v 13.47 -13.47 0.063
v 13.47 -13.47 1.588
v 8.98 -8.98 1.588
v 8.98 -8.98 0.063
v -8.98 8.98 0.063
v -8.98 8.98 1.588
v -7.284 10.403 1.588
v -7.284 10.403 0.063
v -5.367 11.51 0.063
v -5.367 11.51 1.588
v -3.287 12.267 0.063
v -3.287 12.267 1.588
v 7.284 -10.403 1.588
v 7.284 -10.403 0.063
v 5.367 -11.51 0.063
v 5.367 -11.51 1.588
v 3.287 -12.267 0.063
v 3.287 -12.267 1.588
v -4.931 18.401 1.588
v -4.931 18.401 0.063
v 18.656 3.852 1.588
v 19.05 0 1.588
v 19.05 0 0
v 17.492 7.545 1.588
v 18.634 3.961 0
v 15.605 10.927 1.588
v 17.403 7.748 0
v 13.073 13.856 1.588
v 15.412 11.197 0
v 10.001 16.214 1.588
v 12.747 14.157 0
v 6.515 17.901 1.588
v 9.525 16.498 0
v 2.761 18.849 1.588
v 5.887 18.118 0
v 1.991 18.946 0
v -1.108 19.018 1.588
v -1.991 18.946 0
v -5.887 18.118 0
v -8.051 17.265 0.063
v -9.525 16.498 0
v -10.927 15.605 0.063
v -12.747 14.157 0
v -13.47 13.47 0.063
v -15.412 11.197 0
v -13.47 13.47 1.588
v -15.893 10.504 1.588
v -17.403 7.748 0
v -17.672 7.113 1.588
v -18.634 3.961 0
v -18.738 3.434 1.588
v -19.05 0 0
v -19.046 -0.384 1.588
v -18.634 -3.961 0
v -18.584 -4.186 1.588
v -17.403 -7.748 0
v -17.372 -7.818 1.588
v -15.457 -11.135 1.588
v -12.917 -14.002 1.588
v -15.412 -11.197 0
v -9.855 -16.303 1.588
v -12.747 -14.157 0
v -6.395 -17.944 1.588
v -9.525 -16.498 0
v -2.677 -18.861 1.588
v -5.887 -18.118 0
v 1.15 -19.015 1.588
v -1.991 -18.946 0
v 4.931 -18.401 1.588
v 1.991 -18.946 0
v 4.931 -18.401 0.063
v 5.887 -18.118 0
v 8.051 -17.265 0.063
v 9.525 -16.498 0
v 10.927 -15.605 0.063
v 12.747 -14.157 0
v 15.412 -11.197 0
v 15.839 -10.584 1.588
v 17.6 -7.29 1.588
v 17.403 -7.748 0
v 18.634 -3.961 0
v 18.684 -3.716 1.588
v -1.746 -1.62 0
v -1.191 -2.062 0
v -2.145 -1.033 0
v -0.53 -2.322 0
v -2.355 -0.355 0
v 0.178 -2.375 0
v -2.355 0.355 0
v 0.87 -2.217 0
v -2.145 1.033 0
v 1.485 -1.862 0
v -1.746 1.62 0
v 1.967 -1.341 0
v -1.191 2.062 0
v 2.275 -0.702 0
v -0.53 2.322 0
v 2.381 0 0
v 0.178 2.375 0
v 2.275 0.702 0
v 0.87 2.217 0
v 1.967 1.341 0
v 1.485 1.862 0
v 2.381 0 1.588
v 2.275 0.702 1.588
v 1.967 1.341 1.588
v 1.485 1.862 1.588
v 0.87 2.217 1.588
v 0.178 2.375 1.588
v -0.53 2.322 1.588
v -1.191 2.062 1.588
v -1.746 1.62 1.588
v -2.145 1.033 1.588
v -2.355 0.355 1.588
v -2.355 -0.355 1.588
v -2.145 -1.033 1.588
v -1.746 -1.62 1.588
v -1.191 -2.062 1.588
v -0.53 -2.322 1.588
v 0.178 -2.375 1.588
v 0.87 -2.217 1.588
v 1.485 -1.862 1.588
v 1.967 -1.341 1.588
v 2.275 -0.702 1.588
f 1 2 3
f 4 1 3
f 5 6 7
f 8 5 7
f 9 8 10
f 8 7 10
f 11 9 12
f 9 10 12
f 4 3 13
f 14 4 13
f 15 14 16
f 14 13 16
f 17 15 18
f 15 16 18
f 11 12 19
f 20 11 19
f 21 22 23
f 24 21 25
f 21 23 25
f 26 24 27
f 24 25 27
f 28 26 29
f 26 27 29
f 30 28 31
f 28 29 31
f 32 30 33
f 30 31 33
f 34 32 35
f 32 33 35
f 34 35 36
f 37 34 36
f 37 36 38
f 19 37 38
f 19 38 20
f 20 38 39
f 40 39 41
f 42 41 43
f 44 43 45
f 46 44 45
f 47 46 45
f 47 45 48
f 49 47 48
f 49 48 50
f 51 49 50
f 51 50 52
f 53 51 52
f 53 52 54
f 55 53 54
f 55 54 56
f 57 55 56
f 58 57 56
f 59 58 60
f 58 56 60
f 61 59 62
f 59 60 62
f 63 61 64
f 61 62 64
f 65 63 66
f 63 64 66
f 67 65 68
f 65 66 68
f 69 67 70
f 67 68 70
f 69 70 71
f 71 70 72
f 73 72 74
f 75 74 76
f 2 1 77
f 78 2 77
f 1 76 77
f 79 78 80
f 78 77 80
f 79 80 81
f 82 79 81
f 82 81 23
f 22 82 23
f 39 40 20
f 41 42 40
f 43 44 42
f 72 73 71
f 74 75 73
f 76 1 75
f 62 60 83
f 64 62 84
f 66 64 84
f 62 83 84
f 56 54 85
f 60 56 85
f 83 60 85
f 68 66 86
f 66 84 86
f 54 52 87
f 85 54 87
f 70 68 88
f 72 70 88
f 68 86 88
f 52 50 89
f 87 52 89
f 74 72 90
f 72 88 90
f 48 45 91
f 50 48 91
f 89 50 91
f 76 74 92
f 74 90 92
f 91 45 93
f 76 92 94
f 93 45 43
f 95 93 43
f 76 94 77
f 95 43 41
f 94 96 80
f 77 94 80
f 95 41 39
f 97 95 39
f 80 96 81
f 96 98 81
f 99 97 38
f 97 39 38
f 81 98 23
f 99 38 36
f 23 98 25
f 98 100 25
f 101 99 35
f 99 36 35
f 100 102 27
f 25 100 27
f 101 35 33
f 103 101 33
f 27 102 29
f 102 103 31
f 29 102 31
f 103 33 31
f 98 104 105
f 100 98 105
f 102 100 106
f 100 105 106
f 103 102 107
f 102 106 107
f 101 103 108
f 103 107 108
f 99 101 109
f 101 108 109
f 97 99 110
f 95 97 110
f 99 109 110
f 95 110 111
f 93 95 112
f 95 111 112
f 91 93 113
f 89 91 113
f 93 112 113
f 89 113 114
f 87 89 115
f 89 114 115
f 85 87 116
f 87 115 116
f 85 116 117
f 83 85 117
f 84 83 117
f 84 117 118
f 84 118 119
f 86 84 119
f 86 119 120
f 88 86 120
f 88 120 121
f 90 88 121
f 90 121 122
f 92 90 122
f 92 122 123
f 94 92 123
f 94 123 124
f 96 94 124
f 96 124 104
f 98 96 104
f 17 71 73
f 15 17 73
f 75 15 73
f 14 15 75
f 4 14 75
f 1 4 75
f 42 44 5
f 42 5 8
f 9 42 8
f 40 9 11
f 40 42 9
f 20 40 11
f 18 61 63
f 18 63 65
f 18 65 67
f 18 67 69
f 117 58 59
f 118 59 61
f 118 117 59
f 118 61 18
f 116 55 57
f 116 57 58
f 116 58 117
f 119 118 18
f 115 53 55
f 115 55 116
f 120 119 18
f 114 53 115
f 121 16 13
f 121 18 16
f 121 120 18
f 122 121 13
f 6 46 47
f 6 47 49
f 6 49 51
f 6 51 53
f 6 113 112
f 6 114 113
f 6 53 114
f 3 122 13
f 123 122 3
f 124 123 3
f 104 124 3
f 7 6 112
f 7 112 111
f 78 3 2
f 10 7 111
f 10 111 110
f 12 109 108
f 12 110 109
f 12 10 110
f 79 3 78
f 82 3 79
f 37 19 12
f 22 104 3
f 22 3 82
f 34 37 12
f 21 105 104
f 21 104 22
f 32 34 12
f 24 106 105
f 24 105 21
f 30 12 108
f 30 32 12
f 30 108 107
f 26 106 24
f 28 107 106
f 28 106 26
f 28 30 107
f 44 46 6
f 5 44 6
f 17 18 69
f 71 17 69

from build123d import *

# Parameters (mm, degrees)
SKETCH1_R          = 19.05
EXTRUDE1_DEPTH     = 1.5875
SKETCH2_R          = 2.38125
CUT_EXTRUDE1_DEPTH = 3.175
CUT_EXTRUDE2_DEPTH = 1.524


with BuildPart() as part:
    # Sketch1 → Extrude1 (new body)
    with BuildSketch(Plane.XY):
        Circle(SKETCH1_R)
    extrude(amount=EXTRUDE1_DEPTH)

    # Sketch2 → Cut-Extrude1 (cut)
    with BuildSketch(Plane.XY.offset(1.5875)):
        Circle(SKETCH2_R)
    extrude(amount=-CUT_EXTRUDE1_DEPTH, mode=Mode.SUBTRACT)

    # Sketch3 → Cut-Extrude2 (cut)
    with BuildSketch(Plane.XY.offset(1.5875)):
        with BuildLine():
            ThreePointArc((-4.930502809, 18.400886991), (-9.525, 16.497783942), (-13.470384182, 13.470384182))
            Line((-13.470384182, 13.470384182), (-8.980256121, 8.980256121))
            ThreePointArc((-8.980256121, 8.980256121), (-6.35, 10.998522628), (-3.287001873, 12.267257994))
            Line((-3.287001873, 12.267257994), (-4.930502809, 18.400886991))
        make_face()
        with BuildLine():
            Line((3.287001873, -12.267257994), (4.930502809, -18.400886991))
            ThreePointArc((4.930502809, -18.400886991), (9.525, -16.497783942), (13.470384182, -13.470384182))
            Line((13.470384182, -13.470384182), (8.980256121, -8.980256121))
            ThreePointArc((8.980256121, -8.980256121), (6.35, -10.998522628), (3.287001873, -12.267257994))
        make_face()
    extrude(amount=-CUT_EXTRUDE2_DEPTH, mode=Mode.SUBTRACT)


solid = part.part
